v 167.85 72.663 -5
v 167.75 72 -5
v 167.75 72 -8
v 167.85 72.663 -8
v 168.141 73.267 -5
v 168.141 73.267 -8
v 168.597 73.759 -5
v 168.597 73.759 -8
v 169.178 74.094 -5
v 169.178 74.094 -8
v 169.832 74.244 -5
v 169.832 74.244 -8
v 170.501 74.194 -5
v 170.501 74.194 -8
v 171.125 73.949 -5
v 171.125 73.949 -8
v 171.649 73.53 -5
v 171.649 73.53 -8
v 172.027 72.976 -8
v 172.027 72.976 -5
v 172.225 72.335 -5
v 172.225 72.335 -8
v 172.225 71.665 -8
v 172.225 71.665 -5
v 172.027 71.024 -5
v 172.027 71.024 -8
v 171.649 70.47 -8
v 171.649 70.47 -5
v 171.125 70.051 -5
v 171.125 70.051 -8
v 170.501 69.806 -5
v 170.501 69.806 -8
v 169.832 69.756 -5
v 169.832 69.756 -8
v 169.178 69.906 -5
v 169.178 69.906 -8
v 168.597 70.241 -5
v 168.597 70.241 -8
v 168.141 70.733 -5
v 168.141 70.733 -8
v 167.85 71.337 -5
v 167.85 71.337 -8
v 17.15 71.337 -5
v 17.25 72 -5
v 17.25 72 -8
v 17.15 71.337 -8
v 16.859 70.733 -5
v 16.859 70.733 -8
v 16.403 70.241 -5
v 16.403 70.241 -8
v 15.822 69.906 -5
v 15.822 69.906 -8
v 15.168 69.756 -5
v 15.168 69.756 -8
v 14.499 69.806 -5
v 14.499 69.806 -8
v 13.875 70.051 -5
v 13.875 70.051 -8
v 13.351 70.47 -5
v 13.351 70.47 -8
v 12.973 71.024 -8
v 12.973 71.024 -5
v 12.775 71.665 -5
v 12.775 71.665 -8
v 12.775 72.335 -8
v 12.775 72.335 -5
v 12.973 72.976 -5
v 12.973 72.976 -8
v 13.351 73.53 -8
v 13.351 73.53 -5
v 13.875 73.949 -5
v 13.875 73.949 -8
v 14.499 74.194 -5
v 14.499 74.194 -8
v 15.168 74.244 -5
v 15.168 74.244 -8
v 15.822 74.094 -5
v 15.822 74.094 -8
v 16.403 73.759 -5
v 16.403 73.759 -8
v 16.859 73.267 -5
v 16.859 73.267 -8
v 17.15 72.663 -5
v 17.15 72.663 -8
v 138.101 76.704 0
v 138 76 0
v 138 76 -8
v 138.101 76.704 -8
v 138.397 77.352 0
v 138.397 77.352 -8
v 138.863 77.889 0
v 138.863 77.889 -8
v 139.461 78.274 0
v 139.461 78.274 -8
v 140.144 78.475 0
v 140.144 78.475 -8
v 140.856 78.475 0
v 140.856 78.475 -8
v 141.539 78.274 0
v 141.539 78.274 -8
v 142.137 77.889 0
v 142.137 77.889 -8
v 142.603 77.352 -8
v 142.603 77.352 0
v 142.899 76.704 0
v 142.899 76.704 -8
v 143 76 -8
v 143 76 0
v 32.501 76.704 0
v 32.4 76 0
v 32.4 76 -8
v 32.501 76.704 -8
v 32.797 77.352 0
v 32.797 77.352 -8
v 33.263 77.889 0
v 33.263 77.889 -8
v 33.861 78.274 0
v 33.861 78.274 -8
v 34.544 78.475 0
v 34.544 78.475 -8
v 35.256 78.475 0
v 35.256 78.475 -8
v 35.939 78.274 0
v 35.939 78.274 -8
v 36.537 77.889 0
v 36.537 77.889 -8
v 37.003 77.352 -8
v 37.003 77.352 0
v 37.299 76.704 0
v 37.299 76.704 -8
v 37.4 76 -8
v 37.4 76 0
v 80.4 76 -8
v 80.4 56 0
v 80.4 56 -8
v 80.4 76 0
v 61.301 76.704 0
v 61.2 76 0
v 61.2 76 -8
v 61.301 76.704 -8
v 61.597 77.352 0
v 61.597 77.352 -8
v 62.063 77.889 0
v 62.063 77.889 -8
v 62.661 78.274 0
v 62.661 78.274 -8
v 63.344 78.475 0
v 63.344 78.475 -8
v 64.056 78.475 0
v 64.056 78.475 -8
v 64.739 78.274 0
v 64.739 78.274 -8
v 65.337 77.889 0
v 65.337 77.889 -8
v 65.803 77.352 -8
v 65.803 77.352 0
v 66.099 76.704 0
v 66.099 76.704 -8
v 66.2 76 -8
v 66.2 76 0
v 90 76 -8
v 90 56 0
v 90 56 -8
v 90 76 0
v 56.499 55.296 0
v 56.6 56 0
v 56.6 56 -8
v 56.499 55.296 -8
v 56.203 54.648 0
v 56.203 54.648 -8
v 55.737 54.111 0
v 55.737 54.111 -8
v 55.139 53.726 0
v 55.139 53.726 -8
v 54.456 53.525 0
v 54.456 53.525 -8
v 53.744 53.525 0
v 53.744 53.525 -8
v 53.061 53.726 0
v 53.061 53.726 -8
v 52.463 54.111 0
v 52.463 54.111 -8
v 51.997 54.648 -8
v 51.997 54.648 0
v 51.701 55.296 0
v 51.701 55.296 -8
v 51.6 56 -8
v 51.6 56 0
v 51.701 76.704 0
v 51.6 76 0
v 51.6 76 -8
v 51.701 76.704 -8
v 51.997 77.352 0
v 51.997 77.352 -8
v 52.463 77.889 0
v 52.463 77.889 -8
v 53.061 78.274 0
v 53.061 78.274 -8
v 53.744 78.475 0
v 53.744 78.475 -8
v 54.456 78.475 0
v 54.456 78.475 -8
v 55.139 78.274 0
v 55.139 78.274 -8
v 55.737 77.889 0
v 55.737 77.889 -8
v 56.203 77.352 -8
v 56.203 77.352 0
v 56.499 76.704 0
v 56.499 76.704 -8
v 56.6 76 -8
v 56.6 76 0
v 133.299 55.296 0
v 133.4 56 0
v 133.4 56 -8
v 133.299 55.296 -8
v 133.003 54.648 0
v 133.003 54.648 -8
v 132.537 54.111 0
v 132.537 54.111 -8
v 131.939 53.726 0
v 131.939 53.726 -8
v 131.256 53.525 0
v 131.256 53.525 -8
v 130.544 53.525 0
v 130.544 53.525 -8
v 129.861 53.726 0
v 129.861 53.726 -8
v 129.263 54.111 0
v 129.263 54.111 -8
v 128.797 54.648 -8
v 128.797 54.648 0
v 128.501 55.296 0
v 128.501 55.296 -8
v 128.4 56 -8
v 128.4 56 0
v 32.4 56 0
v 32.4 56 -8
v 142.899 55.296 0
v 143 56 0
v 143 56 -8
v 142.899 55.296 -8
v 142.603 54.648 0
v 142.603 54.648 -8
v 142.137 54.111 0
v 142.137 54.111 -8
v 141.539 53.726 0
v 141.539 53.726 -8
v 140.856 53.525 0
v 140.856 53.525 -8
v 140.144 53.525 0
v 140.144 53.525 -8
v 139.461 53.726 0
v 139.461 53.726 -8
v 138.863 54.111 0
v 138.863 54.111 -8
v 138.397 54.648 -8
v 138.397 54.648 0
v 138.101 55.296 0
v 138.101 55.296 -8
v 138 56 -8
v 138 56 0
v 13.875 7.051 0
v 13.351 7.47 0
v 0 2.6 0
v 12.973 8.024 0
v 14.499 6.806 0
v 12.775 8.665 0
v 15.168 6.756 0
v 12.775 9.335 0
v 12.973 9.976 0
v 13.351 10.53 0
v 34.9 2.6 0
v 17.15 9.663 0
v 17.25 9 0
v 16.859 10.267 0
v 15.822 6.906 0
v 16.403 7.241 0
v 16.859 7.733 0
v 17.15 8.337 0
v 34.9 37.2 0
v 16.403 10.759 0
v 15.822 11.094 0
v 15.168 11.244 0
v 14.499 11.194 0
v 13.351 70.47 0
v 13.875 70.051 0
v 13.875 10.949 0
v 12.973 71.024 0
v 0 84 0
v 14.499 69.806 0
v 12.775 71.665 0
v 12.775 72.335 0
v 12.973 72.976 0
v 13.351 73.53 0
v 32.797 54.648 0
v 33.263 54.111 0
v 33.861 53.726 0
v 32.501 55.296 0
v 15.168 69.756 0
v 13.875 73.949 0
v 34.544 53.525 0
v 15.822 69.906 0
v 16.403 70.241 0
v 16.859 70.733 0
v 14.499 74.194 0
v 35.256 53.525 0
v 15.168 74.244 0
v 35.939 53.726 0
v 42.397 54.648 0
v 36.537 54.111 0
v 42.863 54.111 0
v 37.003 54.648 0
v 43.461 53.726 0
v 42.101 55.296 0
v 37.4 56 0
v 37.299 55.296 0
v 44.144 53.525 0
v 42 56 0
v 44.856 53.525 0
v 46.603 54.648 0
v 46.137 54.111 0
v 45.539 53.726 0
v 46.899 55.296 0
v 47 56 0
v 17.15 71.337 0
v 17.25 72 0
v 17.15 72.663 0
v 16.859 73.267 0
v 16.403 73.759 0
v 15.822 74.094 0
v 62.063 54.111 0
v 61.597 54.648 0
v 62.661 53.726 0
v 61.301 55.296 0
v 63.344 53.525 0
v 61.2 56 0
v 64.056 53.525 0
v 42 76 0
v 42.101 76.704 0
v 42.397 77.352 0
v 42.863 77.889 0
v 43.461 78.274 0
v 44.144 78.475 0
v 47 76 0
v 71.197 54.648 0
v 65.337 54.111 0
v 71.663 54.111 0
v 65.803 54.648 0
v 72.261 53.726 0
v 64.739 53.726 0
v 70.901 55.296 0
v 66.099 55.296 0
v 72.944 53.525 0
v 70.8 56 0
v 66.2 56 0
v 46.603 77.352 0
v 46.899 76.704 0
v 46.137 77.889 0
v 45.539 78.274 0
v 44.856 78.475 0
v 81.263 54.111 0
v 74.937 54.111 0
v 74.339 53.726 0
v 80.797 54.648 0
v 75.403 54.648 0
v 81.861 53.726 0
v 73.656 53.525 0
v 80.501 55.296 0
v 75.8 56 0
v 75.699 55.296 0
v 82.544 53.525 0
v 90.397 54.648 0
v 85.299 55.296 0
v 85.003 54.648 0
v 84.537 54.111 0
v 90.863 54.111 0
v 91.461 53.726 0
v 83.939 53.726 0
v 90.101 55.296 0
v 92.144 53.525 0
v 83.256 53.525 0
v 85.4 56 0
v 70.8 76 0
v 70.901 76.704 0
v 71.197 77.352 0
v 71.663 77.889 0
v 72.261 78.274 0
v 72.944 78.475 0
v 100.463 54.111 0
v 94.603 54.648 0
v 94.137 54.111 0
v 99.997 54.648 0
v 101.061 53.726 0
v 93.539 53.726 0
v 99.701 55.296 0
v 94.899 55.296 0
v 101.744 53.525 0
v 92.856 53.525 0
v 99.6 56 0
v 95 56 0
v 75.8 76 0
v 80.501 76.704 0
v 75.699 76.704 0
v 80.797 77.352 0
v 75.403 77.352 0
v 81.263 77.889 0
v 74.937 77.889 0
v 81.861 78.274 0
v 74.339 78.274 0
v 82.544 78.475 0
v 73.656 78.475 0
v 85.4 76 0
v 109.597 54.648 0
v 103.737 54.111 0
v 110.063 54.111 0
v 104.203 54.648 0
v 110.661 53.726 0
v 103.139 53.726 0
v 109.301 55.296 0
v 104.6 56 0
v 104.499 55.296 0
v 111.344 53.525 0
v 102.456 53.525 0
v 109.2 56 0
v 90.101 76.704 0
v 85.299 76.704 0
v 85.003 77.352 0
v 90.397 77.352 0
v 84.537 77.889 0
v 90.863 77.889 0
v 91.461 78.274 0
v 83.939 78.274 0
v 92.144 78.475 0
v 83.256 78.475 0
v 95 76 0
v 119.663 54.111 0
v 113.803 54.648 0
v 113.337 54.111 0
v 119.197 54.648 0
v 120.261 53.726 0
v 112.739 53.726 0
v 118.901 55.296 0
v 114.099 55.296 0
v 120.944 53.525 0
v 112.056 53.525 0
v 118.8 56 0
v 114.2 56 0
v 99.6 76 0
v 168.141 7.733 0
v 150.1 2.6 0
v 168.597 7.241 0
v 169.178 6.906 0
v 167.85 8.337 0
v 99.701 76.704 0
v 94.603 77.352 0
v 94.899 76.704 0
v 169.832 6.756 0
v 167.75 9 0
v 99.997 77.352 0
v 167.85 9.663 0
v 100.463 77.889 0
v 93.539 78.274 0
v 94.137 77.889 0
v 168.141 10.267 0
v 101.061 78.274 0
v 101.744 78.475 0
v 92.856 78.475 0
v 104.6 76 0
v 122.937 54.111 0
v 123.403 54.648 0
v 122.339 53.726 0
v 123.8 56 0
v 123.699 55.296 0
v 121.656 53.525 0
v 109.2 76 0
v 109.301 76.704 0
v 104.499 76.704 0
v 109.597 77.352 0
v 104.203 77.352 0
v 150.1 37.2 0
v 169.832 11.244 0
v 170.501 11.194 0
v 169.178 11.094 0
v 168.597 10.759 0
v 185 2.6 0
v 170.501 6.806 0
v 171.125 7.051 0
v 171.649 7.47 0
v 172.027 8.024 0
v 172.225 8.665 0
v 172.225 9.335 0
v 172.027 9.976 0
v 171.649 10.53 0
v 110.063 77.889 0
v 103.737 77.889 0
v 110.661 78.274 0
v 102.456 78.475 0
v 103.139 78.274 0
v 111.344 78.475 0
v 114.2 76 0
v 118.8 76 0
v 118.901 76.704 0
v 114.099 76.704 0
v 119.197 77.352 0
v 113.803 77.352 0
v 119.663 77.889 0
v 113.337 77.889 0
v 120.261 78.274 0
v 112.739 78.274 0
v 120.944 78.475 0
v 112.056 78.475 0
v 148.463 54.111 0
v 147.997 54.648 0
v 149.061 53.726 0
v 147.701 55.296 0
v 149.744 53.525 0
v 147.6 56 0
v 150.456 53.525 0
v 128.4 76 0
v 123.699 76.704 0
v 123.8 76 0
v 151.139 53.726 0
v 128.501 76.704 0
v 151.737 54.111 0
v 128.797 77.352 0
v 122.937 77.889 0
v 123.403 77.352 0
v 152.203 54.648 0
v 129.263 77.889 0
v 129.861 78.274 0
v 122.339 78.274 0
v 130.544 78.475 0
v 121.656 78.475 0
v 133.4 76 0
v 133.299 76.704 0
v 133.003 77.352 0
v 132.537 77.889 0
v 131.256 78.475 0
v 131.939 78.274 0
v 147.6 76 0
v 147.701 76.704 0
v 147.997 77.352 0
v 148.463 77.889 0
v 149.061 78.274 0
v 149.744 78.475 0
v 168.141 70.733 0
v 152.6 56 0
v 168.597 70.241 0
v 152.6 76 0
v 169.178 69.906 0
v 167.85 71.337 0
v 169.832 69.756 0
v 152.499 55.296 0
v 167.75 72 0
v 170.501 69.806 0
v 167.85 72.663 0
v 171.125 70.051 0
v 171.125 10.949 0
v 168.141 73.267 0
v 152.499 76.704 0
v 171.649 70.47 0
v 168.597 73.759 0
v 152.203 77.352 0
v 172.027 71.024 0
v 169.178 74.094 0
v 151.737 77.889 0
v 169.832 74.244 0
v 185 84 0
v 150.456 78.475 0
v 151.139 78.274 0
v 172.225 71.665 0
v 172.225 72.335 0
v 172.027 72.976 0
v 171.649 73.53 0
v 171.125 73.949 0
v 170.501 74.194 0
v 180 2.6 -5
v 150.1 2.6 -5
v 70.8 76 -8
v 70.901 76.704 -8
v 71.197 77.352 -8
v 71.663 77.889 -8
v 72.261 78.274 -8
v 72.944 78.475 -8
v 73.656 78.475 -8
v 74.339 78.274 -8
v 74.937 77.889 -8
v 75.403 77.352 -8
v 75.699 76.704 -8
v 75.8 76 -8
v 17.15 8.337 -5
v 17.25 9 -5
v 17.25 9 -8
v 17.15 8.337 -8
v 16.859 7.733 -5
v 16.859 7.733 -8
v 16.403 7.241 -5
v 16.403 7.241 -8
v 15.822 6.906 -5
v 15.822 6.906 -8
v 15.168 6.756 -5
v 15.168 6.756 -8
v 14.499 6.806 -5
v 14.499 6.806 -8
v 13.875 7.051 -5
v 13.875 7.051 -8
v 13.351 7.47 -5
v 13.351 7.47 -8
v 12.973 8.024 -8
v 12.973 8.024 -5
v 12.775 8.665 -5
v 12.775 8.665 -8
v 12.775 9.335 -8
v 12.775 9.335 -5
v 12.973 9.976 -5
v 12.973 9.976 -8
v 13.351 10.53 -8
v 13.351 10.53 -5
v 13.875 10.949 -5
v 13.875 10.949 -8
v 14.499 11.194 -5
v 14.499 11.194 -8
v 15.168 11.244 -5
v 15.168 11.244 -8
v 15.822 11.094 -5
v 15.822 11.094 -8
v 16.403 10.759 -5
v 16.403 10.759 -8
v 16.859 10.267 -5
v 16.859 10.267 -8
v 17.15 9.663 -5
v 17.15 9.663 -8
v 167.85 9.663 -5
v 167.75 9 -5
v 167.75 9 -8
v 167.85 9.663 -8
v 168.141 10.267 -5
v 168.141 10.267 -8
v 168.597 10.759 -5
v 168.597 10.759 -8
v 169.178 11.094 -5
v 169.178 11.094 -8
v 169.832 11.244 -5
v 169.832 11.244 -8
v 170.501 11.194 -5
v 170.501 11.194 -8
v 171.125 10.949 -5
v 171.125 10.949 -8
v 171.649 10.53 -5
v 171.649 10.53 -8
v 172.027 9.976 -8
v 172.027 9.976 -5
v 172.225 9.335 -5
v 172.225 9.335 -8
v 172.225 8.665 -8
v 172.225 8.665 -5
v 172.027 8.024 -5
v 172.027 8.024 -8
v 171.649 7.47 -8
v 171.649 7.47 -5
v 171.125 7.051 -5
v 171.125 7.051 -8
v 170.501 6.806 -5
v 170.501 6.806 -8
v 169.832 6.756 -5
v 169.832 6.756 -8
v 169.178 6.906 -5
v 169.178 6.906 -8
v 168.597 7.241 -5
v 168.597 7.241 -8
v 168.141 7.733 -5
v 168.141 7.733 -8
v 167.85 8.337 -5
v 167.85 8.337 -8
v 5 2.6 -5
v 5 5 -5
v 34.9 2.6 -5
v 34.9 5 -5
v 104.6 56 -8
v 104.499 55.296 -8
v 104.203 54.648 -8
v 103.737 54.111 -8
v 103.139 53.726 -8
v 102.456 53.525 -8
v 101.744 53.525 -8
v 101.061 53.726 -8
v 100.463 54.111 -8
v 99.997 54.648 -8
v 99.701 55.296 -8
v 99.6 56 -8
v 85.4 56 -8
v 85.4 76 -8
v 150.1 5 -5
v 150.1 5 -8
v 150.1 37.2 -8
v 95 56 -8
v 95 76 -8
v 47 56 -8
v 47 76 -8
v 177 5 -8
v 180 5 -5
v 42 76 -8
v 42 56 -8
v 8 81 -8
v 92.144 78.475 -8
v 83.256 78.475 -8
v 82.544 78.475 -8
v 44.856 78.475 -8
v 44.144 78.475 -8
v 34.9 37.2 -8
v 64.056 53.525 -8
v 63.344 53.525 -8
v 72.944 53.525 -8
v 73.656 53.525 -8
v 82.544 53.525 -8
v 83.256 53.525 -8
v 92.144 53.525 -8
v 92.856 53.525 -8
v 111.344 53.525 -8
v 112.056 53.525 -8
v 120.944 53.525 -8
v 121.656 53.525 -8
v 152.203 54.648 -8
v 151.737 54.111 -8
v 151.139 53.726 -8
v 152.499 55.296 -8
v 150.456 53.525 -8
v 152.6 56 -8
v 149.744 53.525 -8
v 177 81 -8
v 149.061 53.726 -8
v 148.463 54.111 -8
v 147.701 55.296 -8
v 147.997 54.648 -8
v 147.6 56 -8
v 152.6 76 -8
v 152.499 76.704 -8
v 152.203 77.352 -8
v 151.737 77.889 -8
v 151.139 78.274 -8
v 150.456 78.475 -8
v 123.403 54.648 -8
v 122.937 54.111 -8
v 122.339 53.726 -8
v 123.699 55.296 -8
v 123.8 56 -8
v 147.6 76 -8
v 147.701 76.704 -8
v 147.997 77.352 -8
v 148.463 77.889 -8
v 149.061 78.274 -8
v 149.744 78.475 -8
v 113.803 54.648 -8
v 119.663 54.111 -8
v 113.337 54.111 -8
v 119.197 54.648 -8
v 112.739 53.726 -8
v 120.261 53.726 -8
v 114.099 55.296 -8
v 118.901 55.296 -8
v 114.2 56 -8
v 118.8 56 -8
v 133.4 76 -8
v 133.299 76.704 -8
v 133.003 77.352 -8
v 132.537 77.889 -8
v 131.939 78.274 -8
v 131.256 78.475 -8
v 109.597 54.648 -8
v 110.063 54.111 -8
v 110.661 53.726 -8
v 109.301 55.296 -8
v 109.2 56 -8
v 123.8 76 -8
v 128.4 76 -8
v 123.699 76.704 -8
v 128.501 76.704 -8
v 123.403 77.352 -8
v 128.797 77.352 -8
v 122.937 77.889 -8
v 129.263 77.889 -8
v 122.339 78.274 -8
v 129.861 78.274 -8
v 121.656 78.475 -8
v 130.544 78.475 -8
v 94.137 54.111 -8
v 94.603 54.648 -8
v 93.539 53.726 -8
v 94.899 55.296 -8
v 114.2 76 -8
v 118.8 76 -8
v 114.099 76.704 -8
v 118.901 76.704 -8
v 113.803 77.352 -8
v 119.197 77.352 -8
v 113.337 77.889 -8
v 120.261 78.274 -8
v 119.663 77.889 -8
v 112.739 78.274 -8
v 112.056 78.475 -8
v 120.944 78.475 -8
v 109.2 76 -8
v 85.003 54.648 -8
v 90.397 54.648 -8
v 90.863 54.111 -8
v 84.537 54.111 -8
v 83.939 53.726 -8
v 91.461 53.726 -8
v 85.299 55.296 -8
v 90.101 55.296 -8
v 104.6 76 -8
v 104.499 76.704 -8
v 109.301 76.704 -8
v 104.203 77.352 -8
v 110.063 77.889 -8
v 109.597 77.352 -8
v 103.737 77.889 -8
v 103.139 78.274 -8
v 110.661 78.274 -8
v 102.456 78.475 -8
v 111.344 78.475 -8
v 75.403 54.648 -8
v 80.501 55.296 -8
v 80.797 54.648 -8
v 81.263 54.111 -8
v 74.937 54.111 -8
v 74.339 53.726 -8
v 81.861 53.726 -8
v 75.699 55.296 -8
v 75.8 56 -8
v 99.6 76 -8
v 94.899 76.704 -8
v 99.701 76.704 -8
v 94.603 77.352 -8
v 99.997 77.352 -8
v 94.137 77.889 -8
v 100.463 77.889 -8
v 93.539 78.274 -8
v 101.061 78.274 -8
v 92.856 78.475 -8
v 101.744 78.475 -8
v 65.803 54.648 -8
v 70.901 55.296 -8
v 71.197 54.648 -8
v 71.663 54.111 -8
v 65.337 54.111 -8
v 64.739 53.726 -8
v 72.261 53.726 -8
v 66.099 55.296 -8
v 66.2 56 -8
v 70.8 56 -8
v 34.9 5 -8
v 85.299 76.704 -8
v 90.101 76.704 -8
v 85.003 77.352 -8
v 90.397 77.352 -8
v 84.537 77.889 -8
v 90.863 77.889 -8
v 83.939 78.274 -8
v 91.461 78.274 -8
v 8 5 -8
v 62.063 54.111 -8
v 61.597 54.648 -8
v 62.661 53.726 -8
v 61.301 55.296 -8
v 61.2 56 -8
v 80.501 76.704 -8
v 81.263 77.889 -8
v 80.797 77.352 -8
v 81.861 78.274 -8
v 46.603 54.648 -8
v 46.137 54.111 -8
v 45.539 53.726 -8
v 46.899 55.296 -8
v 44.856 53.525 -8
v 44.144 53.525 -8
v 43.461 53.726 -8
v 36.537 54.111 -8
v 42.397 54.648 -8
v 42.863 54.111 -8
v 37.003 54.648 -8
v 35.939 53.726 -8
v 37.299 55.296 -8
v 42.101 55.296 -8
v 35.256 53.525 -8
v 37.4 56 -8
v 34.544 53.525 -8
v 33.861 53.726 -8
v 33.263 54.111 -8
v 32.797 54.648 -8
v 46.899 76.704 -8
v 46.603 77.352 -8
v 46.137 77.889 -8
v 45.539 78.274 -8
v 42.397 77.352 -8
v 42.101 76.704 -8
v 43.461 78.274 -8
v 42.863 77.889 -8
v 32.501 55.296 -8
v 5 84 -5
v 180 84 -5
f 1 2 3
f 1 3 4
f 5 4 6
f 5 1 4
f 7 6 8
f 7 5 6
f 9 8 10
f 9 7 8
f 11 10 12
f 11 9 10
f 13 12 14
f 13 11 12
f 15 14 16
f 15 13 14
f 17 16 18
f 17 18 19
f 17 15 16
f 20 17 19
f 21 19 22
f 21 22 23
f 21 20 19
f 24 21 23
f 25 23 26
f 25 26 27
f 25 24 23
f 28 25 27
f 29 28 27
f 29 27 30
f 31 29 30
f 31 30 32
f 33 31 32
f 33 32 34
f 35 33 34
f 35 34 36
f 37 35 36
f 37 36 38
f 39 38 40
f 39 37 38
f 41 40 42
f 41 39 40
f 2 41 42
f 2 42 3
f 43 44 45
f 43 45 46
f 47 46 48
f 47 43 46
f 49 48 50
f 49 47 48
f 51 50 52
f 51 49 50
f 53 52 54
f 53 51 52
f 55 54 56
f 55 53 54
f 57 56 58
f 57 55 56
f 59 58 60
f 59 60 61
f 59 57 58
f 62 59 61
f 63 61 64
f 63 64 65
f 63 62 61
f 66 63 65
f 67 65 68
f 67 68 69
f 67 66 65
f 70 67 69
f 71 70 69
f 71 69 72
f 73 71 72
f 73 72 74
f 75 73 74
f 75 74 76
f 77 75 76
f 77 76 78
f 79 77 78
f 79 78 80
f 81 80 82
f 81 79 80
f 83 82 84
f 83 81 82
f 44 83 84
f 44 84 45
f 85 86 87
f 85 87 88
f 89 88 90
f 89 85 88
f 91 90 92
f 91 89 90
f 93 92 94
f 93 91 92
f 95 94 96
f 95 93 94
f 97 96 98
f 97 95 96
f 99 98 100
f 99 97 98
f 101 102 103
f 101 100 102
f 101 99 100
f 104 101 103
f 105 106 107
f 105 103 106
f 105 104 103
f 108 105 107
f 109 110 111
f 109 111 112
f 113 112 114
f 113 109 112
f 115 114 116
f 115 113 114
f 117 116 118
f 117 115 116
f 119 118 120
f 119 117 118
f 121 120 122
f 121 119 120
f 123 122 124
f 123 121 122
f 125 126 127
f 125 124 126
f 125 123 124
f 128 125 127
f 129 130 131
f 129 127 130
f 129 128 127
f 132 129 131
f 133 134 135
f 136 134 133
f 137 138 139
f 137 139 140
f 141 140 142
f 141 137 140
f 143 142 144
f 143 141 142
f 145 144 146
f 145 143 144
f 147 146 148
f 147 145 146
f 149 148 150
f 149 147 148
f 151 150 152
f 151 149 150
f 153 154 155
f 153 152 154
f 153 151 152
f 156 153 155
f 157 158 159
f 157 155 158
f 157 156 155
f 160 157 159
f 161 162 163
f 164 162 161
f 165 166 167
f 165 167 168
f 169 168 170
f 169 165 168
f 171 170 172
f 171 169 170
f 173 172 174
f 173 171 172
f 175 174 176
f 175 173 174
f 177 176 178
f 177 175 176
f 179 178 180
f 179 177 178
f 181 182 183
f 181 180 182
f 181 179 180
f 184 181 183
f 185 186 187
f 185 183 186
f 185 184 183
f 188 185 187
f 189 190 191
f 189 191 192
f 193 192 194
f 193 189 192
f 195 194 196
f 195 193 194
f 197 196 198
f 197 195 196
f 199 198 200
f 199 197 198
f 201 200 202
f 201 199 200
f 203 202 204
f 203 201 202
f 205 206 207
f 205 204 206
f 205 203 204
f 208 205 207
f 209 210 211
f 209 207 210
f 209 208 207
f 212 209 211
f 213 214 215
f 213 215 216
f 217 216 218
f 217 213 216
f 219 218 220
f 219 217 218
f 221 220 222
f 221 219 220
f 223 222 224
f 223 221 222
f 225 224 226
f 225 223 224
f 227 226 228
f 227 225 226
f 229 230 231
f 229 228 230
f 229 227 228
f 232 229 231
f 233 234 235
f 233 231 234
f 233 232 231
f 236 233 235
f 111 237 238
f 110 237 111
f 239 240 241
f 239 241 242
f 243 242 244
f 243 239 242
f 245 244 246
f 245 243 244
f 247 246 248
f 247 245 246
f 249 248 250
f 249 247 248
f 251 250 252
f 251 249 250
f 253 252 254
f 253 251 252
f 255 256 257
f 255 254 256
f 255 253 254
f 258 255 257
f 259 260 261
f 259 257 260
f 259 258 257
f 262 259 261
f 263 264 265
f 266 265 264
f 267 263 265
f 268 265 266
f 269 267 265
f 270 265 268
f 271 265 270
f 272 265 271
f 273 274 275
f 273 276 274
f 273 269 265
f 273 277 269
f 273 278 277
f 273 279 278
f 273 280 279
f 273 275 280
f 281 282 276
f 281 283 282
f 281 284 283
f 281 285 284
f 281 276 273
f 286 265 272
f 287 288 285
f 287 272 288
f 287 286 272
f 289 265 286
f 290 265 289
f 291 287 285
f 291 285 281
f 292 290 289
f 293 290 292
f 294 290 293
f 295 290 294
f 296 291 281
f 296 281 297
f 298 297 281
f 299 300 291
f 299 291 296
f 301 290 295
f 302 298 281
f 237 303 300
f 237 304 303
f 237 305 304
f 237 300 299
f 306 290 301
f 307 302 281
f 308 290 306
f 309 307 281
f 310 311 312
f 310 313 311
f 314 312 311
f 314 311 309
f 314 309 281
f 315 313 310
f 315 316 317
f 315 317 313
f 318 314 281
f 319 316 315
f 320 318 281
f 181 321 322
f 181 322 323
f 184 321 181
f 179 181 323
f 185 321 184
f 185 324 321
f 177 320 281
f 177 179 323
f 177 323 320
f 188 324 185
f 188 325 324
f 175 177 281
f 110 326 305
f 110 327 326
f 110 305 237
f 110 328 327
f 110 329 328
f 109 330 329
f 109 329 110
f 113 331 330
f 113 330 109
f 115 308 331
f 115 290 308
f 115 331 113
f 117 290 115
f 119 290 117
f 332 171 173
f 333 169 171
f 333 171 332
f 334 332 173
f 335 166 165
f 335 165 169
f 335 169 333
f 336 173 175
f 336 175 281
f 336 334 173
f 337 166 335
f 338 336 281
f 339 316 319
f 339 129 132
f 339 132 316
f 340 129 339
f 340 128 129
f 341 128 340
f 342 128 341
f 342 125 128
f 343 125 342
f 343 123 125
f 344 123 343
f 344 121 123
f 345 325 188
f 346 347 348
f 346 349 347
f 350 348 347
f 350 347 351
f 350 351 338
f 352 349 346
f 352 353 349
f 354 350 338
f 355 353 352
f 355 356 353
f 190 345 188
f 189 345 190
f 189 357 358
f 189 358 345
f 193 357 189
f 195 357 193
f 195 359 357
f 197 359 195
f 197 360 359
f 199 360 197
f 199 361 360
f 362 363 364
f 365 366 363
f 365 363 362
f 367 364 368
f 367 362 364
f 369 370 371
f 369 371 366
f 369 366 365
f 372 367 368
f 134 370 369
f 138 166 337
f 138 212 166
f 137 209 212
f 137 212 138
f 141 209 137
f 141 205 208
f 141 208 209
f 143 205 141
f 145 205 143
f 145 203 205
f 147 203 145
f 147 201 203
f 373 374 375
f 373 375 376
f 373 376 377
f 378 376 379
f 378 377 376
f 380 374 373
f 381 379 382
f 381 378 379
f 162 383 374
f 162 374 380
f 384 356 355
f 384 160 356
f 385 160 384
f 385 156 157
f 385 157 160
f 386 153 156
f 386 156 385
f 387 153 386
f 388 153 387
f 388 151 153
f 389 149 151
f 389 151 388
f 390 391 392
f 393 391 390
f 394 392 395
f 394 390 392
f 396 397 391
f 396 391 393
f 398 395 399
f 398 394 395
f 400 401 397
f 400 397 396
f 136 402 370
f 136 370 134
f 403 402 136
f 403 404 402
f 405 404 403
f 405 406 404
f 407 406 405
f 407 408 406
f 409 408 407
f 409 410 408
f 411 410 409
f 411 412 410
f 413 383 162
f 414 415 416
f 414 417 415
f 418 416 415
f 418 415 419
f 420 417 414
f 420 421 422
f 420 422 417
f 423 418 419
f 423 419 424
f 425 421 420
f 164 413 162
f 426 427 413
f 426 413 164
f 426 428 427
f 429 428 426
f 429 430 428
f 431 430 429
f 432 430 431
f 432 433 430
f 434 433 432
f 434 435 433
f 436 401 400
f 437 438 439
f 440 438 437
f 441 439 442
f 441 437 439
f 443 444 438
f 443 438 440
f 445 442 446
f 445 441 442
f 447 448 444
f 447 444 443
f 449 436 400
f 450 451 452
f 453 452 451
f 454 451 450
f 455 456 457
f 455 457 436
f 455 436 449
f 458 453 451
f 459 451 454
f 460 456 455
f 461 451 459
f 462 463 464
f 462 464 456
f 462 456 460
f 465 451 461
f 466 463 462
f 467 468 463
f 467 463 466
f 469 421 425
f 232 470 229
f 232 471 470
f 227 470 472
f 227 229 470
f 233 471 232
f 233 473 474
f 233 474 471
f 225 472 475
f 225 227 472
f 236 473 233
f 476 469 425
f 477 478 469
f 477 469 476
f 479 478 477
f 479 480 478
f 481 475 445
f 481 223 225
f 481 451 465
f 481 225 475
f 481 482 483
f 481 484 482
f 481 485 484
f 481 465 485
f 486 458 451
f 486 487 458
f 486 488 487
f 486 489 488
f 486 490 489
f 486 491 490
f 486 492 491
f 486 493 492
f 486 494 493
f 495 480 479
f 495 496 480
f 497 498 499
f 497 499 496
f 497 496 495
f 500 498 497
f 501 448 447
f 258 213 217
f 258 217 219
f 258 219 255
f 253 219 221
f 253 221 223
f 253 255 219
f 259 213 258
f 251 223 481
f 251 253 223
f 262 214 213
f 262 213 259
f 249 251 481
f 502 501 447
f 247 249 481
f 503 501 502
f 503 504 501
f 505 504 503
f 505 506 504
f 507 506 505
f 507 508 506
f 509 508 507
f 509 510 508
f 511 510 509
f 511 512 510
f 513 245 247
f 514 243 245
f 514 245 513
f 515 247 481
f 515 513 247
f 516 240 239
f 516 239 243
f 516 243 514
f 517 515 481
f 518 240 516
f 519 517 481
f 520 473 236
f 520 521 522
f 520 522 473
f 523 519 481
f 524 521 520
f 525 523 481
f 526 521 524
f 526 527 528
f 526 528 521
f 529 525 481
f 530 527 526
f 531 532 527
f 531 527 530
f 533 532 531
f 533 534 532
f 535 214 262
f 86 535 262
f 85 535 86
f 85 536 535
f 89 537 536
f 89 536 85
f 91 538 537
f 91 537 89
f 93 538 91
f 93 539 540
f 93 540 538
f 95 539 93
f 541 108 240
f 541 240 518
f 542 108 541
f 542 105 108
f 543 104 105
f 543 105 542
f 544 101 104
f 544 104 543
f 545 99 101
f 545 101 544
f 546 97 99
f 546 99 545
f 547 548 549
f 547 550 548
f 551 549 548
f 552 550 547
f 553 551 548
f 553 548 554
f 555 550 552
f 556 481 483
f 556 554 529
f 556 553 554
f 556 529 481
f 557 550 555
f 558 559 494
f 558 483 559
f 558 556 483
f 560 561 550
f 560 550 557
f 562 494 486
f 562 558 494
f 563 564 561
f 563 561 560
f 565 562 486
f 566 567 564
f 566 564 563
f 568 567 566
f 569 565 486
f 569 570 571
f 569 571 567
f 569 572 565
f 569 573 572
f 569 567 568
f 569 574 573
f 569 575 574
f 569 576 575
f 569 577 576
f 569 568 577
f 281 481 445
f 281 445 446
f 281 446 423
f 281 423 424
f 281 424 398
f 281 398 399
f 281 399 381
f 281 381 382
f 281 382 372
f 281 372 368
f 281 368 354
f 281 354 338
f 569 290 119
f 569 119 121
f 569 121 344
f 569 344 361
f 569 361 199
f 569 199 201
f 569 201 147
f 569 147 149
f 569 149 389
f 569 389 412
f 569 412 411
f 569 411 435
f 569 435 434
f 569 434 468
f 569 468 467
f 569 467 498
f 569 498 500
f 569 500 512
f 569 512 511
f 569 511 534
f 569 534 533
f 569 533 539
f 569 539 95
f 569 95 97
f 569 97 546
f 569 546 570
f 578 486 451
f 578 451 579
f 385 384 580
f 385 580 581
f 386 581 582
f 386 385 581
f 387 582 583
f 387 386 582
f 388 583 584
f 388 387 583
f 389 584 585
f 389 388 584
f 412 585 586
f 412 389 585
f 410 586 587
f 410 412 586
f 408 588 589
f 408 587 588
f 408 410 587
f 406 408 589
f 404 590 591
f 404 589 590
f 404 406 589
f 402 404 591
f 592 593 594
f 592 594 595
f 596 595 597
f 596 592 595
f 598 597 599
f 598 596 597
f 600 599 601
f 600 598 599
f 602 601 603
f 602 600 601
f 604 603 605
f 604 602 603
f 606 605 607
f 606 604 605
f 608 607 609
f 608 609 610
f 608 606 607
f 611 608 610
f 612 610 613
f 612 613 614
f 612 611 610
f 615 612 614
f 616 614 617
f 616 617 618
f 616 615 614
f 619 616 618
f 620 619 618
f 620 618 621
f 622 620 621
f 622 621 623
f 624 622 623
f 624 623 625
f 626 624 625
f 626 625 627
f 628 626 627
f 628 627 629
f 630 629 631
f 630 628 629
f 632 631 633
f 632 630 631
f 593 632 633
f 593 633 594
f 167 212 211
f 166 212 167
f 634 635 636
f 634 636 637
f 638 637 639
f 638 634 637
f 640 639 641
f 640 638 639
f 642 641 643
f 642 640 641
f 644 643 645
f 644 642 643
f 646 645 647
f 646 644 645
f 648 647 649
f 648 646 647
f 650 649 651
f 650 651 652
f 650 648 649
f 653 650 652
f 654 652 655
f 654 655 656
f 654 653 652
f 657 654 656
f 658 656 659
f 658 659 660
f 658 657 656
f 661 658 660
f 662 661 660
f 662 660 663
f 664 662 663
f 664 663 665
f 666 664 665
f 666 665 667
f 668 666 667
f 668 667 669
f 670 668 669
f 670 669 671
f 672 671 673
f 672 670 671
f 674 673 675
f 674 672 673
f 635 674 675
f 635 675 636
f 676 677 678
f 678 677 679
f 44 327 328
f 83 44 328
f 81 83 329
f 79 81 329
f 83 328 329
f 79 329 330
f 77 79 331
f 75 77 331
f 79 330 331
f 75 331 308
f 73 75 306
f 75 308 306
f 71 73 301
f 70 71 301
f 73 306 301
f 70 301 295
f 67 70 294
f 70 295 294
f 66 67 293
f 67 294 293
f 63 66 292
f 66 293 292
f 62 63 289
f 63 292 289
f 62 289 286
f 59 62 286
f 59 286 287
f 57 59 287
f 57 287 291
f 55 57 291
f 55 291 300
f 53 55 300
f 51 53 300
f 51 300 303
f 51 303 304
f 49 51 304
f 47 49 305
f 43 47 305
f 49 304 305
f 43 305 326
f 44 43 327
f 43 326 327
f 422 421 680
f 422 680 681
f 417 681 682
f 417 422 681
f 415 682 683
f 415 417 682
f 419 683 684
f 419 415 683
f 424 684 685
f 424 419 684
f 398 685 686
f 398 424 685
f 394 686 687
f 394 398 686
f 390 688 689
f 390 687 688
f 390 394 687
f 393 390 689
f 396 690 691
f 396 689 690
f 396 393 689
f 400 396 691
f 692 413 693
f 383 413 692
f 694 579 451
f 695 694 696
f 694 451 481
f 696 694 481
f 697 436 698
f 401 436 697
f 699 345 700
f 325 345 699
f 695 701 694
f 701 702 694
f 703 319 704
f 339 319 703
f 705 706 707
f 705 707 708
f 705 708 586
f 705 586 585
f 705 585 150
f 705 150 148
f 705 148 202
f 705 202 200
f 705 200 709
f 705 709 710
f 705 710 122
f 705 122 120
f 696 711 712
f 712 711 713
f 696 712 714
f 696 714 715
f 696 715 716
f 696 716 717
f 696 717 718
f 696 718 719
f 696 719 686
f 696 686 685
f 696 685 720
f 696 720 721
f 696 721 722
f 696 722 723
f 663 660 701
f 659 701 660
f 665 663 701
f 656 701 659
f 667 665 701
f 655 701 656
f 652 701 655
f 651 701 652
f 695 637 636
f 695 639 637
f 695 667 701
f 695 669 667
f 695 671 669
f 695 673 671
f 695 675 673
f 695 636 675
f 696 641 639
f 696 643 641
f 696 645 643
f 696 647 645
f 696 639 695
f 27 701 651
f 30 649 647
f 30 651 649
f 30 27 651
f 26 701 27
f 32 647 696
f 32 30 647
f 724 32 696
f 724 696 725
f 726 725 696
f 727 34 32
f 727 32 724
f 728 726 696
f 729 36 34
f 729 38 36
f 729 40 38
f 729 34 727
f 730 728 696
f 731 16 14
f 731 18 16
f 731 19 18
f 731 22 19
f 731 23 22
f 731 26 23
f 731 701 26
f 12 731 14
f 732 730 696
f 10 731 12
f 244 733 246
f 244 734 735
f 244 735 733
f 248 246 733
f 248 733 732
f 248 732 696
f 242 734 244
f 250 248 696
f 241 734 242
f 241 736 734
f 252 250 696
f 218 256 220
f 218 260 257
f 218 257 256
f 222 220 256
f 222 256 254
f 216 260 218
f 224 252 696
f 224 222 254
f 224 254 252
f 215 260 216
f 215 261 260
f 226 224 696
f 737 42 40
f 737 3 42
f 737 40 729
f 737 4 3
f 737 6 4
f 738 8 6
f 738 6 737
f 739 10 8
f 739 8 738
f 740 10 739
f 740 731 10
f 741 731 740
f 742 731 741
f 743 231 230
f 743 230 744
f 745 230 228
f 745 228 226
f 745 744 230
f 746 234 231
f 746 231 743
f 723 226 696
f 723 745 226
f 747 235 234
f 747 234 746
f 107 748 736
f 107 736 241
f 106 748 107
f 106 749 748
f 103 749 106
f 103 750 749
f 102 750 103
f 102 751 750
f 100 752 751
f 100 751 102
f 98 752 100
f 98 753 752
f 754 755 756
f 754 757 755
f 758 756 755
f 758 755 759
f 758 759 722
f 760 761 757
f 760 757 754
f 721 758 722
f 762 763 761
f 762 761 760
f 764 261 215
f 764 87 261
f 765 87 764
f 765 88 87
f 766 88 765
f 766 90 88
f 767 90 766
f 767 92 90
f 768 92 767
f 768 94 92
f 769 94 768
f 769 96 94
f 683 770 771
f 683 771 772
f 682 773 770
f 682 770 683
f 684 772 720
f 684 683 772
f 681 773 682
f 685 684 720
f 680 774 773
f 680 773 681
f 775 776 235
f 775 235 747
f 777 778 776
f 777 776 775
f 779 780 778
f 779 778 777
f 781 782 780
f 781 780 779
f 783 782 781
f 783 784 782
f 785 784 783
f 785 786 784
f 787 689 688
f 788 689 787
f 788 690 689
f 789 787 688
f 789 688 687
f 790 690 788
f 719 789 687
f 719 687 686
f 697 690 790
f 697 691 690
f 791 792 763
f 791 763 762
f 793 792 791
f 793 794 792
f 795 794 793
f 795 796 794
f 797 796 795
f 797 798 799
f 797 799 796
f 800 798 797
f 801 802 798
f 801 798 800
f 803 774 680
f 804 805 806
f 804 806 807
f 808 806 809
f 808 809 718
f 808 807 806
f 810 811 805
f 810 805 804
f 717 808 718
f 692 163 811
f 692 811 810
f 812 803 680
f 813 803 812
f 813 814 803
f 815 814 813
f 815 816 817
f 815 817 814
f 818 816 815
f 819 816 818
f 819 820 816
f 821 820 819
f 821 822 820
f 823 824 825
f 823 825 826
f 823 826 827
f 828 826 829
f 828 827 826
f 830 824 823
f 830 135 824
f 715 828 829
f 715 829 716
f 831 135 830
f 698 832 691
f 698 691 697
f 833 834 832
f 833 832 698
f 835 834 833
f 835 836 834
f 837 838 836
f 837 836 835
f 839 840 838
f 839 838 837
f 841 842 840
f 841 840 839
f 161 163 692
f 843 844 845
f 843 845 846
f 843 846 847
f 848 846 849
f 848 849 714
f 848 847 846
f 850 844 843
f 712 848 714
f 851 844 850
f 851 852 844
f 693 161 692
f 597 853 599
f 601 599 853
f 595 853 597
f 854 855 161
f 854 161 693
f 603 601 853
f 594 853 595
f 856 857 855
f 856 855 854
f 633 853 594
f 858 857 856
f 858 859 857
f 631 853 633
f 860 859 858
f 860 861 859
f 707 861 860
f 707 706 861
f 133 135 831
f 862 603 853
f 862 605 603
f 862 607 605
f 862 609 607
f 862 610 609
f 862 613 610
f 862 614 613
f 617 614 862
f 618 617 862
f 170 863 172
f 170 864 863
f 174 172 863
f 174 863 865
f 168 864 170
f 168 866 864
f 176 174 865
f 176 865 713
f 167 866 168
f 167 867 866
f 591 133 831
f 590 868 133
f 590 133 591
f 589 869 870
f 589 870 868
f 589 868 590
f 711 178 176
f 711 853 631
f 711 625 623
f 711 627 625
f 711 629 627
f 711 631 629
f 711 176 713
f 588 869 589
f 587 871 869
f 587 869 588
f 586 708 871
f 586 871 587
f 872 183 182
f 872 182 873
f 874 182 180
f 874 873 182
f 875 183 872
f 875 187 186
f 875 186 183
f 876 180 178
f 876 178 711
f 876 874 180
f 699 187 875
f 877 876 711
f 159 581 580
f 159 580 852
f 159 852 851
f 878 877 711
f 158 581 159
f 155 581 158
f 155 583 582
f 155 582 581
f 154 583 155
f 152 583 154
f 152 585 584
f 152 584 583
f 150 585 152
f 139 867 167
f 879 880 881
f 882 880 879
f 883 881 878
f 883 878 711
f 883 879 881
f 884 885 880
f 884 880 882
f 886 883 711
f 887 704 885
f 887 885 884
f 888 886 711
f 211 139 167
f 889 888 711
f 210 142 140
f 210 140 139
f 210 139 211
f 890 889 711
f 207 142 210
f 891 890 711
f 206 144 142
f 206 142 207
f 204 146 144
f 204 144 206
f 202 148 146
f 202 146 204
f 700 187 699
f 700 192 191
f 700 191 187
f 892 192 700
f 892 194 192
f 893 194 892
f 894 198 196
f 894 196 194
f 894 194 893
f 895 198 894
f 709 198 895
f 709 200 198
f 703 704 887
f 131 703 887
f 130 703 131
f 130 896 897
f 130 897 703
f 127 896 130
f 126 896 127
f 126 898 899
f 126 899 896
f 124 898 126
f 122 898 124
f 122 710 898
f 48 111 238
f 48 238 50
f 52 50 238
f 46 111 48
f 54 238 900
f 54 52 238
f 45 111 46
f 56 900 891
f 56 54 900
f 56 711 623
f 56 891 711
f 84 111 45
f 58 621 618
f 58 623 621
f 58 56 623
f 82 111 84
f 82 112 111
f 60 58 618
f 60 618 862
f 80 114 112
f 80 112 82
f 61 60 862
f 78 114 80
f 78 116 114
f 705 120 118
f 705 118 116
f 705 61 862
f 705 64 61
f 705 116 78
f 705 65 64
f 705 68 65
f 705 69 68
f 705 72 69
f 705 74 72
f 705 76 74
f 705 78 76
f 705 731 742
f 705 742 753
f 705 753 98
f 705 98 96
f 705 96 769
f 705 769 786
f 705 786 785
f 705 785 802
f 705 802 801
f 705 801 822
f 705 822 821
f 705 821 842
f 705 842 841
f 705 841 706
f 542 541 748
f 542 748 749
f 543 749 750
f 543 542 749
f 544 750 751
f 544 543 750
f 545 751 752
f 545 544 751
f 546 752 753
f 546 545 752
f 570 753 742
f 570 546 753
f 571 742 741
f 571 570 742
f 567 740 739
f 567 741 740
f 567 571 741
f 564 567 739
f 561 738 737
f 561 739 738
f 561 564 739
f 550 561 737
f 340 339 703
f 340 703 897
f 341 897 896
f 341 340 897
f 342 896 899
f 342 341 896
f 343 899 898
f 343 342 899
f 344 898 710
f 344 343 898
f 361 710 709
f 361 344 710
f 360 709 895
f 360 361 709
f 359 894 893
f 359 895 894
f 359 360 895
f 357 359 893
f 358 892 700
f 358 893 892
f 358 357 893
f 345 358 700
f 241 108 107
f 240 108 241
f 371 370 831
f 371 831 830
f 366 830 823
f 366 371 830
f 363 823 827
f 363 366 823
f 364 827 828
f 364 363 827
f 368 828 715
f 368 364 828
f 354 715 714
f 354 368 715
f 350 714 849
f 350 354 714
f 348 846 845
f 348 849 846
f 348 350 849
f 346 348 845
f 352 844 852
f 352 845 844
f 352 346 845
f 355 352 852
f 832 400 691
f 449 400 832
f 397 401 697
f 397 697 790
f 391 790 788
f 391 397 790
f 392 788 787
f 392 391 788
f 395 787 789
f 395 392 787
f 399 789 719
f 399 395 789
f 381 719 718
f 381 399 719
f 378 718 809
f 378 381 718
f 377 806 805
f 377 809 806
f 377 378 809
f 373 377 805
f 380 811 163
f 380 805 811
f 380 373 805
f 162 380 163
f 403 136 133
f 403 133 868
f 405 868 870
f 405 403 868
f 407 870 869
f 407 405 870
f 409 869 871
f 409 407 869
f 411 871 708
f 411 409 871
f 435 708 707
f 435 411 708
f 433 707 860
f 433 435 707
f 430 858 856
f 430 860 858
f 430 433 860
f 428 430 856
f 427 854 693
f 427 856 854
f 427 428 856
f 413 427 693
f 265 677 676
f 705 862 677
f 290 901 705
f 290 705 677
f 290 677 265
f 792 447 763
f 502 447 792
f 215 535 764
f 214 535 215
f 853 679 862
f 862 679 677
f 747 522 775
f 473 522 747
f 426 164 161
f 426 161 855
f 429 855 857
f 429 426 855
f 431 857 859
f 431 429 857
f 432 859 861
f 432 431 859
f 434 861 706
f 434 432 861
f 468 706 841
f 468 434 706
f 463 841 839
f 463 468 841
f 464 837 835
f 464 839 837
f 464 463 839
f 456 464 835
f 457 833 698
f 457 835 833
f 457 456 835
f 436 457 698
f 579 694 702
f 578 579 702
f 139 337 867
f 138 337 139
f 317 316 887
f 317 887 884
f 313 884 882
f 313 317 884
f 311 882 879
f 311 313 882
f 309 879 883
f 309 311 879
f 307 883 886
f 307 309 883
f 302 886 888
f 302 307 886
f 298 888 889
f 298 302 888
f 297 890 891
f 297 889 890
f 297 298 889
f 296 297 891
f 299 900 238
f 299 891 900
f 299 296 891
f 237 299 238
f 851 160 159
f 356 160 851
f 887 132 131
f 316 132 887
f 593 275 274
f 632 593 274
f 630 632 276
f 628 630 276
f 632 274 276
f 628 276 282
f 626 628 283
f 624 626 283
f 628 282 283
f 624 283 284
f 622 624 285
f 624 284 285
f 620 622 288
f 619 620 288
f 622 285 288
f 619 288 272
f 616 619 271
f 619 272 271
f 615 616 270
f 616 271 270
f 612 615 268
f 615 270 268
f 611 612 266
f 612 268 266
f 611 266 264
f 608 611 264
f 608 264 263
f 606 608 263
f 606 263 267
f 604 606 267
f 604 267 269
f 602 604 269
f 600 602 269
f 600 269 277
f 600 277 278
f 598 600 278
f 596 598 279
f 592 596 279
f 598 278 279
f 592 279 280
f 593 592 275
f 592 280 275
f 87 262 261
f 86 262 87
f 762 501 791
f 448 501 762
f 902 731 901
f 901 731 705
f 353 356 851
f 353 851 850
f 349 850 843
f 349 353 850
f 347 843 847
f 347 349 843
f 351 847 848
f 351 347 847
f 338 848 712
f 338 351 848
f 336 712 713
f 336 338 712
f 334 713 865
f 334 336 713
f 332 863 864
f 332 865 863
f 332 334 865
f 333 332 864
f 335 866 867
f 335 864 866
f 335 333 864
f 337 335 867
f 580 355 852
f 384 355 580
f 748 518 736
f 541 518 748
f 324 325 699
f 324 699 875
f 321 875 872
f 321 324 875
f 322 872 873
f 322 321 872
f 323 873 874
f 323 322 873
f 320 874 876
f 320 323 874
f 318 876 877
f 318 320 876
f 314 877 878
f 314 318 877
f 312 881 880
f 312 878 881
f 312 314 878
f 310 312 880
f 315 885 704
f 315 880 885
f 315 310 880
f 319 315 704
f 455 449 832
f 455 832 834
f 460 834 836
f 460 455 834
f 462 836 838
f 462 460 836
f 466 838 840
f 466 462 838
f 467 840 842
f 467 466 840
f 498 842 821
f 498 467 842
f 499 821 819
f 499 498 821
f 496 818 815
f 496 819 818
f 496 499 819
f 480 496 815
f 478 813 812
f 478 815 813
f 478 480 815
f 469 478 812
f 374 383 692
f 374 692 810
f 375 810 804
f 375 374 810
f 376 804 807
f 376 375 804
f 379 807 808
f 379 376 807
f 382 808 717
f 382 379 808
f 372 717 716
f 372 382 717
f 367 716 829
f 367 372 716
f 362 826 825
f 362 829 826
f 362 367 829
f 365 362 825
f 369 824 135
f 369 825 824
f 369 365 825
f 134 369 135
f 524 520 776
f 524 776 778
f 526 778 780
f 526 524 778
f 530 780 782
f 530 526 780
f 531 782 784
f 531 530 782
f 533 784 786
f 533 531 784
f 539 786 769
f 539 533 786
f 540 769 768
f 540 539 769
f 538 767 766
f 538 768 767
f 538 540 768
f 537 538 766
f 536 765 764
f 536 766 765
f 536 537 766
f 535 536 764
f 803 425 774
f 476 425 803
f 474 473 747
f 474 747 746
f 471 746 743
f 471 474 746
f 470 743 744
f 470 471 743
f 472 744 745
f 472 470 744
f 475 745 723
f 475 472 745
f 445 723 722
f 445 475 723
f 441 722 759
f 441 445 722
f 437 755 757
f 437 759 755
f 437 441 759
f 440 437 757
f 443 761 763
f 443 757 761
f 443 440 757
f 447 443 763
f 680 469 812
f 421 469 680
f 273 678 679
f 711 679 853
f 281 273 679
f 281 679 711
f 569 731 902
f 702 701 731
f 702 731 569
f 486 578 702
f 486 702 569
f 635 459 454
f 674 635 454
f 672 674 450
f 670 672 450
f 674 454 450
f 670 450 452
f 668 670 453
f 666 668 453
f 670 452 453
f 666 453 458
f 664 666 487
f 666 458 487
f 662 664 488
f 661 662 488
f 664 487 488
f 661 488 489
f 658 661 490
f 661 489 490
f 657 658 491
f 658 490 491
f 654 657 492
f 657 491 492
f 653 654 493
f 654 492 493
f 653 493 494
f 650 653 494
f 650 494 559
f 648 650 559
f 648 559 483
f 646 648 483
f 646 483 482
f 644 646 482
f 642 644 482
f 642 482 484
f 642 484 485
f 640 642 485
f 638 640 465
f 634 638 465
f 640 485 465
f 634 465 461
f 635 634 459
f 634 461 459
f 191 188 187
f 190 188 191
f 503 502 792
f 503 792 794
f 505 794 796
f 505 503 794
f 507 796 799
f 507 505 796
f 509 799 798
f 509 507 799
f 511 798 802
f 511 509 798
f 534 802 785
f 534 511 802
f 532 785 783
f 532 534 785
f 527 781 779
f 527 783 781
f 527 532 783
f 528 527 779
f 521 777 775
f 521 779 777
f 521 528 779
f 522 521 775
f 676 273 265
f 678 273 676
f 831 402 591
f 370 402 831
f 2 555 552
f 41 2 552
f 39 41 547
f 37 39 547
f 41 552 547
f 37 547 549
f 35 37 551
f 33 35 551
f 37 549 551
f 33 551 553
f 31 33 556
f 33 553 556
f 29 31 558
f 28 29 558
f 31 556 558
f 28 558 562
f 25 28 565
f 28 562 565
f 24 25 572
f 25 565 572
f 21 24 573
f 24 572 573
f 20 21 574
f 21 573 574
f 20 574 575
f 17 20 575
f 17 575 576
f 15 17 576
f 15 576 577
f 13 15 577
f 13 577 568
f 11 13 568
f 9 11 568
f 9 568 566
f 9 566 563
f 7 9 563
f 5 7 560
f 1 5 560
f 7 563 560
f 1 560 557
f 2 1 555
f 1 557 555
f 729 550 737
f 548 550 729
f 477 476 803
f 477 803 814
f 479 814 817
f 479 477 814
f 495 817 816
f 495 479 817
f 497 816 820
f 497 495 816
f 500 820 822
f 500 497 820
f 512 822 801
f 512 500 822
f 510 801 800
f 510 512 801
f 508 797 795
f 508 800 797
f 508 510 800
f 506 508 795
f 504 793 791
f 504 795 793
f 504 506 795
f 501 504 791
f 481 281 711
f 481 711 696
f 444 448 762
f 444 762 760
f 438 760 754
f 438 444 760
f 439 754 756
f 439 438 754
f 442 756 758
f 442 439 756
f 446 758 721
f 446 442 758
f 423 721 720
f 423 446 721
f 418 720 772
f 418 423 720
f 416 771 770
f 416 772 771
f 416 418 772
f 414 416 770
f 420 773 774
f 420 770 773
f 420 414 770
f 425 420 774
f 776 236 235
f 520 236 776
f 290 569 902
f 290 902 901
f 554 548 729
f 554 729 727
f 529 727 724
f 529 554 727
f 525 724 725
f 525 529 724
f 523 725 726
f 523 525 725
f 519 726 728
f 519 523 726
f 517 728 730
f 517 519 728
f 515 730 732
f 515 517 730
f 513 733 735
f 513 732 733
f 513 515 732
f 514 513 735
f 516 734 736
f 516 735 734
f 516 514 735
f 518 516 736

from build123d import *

# Parameters (mm, degrees)
SKETCH1_W           = 185
SKETCH1_H           = 84
SKETCH1_R           = 2.25
BOSS_EXTRUDE1_DEPTH = 5
SKETCH2_W           = 185
SKETCH2_H           = 79
SKETCH2_R           = 2.25
BOSS_EXTRUDE2_DEPTH = 3
CHAMFER1_SIZE       = 8
CHAMFER3_SIZE       = 3
SKETCH3_W           = 7.071067812
SKETCH3_H           = 2.6
CUT_EXTRUDE1_DEPTH  = 221.270985121
SKETCH4_W           = 115.2
SKETCH4_H           = 34.6
CUT_EXTRUDE2_DEPTH  = 204.334699449


with BuildPart() as part:
    # Sketch1 → Boss-Extrude1 (new body)
    with BuildSketch(Plane.XY):
        with Locations((92.5, 42)):
            Rectangle(SKETCH1_W, SKETCH1_H)
        with Locations((15, 9)):
            Circle(SKETCH1_R, mode=Mode.SUBTRACT)
        with Locations(Location((170, 9, 0), (0, 0, 180))):
            Circle(SKETCH1_R, mode=Mode.SUBTRACT)
        with Locations((15, 72)):
            Circle(SKETCH1_R, mode=Mode.SUBTRACT)
        with Locations(Location((170, 72, 0), (0, 0, 180))):
            Circle(SKETCH1_R, mode=Mode.SUBTRACT)
    extrude(amount=-BOSS_EXTRUDE1_DEPTH)

    # Sketch2 → Boss-Extrude2 (add)
    with BuildSketch(Plane(origin=(0, 0, -5), x_dir=(-1, 0, 0), z_dir=(0, 0, -1))):
        with Locations((-92.5, 44.5)):
            Rectangle(SKETCH2_W, SKETCH2_H)
        with Locations(Location((-15, 9, 0), (0, 0, 180))):
            Circle(SKETCH2_R, mode=Mode.SUBTRACT)
        with Locations((-170, 9)):
            Circle(SKETCH2_R, mode=Mode.SUBTRACT)
        with Locations(Location((-15, 72, 0), (0, 0, 180))):
            Circle(SKETCH2_R, mode=Mode.SUBTRACT)
        with Locations((-170, 72)):
            Circle(SKETCH2_R, mode=Mode.SUBTRACT)
    extrude(amount=BOSS_EXTRUDE2_DEPTH)

    # Chamfer1
    # the kernel refuses this chamfer: 8 mm, written as the material it takes off along each edge
    with BuildSketch(Plane(origin=(185, -15.573463904, -8), x_dir=(-0.9996219169112968, 0, -0.027495876610586296), z_dir=(0, 1, 0)), Plane(origin=(0, 104.573463904, -8), x_dir=(0.9996219169112968, 0, -0.027495876610586275), z_dir=(0, -1, 0))) as chamfer1_piece_1:
        Polygon((CHAMFER1_SIZE * 0.999621916911, CHAMFER1_SIZE * 0.0274958766106), (-CHAMFER1_SIZE * 0.0274958766106, CHAMFER1_SIZE * 0.999621916911), (0, 0), align=None)
    extrude(amount=120.146927807, mode=Mode.SUBTRACT)

    # Chamfer3
    chamfer3_edges = [part.edges().sort_by_distance(p)[0] for p in [
        (92.5, 84, -8),
    ]]
    chamfer(chamfer3_edges, length=CHAMFER3_SIZE)

    # Sketch3 → Cut-Extrude1 (cut, through all, along a direction that is not the sketch's normal)
    with BuildSketch(Plane(origin=(92.5, 0, -92.5), x_dir=(-0.7071067811865452, 0, -0.7071067811865498), z_dir=(0.7071067811865498, 0, -0.7071067811865452))):
        with Locations((-127.279220614, 1.3)):
            Rectangle(SKETCH3_W, SKETCH3_H)
    extrude(amount=-CUT_EXTRUDE1_DEPTH, dir=(1, 0, 0), mode=Mode.SUBTRACT)

    # Sketch4 → Cut-Extrude2 (cut, through all)
    with BuildSketch(Plane.XY):
        with Locations((92.5, 19.9)):
            Rectangle(SKETCH4_W, SKETCH4_H)
        with BuildLine():
            Line((37.4, 76), (37.4, 56))
            ThreePointArc((37.4, 56), (34.9, 53.5), (32.4, 56))
            Line((32.4, 56), (32.4, 76))
            ThreePointArc((32.4, 76), (34.9, 78.5), (37.4, 76))
        make_face()
        with BuildLine():
            Line((47, 76), (47, 56))
            ThreePointArc((47, 56), (44.5, 53.5), (42, 56))
            Line((42, 56), (42, 76))
            ThreePointArc((42, 76), (44.5, 78.5), (47, 76))
        make_face()
        with BuildLine():
            Line((56.6, 76), (56.6, 56))
            ThreePointArc((56.6, 56), (54.1, 53.5), (51.6, 56))
            Line((51.6, 56), (51.6, 76))
            ThreePointArc((51.6, 76), (54.1, 78.5), (56.6, 76))
        make_face()
        with BuildLine():
            Line((66.2, 76), (66.2, 56))
            ThreePointArc((66.2, 56), (63.7, 53.5), (61.2, 56))
            Line((61.2, 56), (61.2, 76))
            ThreePointArc((61.2, 76), (63.7, 78.5), (66.2, 76))
        make_face()
        with BuildLine():
            Line((75.8, 76), (75.8, 56))
            ThreePointArc((75.8, 56), (73.3, 53.5), (70.8, 56))
            Line((70.8, 56), (70.8, 76))
            ThreePointArc((70.8, 76), (73.3, 78.5), (75.8, 76))
        make_face()
        with BuildLine():
            Line((85.4, 76), (85.4, 56))
            ThreePointArc((85.4, 56), (82.9, 53.5), (80.4, 56))
            Line((80.4, 56), (80.4, 76))
            ThreePointArc((80.4, 76), (82.9, 78.5), (85.4, 76))
        make_face()
        with BuildLine():
            Line((95, 76), (95, 56))
            ThreePointArc((95, 56), (92.5, 53.5), (90, 56))
            Line((90, 56), (90, 76))
            ThreePointArc((90, 76), (92.5, 78.5), (95, 76))
        make_face()
        with BuildLine():
            Line((104.6, 76), (104.6, 56))
            ThreePointArc((104.6, 56), (102.1, 53.5), (99.6, 56))
            Line((99.6, 56), (99.6, 76))
            ThreePointArc((99.6, 76), (102.1, 78.5), (104.6, 76))
        make_face()
        with BuildLine():
            Line((114.2, 76), (114.2, 56))
            ThreePointArc((114.2, 56), (111.7, 53.5), (109.2, 56))
            Line((109.2, 56), (109.2, 76))
            ThreePointArc((109.2, 76), (111.7, 78.5), (114.2, 76))
        make_face()
        with BuildLine():
            Line((123.8, 76), (123.8, 56))
            ThreePointArc((123.8, 56), (121.3, 53.5), (118.8, 56))
            Line((118.8, 56), (118.8, 76))
            ThreePointArc((118.8, 76), (121.3, 78.5), (123.8, 76))
        make_face()
        with BuildLine():
            Line((133.4, 76), (133.4, 56))
            ThreePointArc((133.4, 56), (130.9, 53.5), (128.4, 56))
            Line((128.4, 56), (128.4, 76))
            ThreePointArc((128.4, 76), (130.9, 78.5), (133.4, 76))
        make_face()
        with BuildLine():
            Line((143, 76), (143, 56))
            ThreePointArc((143, 56), (140.5, 53.5), (138, 56))
            Line((138, 56), (138, 76))
            ThreePointArc((138, 76), (140.5, 78.5), (143, 76))
        make_face()
        with BuildLine():
            Line((152.6, 76), (152.6, 56))
            ThreePointArc((152.6, 56), (150.1, 53.5), (147.6, 56))
            Line((147.6, 56), (147.6, 76))
            ThreePointArc((147.6, 76), (150.1, 78.5), (152.6, 76))
        make_face()
    extrude(amount=-CUT_EXTRUDE2_DEPTH, mode=Mode.SUBTRACT)


solid = part.part
